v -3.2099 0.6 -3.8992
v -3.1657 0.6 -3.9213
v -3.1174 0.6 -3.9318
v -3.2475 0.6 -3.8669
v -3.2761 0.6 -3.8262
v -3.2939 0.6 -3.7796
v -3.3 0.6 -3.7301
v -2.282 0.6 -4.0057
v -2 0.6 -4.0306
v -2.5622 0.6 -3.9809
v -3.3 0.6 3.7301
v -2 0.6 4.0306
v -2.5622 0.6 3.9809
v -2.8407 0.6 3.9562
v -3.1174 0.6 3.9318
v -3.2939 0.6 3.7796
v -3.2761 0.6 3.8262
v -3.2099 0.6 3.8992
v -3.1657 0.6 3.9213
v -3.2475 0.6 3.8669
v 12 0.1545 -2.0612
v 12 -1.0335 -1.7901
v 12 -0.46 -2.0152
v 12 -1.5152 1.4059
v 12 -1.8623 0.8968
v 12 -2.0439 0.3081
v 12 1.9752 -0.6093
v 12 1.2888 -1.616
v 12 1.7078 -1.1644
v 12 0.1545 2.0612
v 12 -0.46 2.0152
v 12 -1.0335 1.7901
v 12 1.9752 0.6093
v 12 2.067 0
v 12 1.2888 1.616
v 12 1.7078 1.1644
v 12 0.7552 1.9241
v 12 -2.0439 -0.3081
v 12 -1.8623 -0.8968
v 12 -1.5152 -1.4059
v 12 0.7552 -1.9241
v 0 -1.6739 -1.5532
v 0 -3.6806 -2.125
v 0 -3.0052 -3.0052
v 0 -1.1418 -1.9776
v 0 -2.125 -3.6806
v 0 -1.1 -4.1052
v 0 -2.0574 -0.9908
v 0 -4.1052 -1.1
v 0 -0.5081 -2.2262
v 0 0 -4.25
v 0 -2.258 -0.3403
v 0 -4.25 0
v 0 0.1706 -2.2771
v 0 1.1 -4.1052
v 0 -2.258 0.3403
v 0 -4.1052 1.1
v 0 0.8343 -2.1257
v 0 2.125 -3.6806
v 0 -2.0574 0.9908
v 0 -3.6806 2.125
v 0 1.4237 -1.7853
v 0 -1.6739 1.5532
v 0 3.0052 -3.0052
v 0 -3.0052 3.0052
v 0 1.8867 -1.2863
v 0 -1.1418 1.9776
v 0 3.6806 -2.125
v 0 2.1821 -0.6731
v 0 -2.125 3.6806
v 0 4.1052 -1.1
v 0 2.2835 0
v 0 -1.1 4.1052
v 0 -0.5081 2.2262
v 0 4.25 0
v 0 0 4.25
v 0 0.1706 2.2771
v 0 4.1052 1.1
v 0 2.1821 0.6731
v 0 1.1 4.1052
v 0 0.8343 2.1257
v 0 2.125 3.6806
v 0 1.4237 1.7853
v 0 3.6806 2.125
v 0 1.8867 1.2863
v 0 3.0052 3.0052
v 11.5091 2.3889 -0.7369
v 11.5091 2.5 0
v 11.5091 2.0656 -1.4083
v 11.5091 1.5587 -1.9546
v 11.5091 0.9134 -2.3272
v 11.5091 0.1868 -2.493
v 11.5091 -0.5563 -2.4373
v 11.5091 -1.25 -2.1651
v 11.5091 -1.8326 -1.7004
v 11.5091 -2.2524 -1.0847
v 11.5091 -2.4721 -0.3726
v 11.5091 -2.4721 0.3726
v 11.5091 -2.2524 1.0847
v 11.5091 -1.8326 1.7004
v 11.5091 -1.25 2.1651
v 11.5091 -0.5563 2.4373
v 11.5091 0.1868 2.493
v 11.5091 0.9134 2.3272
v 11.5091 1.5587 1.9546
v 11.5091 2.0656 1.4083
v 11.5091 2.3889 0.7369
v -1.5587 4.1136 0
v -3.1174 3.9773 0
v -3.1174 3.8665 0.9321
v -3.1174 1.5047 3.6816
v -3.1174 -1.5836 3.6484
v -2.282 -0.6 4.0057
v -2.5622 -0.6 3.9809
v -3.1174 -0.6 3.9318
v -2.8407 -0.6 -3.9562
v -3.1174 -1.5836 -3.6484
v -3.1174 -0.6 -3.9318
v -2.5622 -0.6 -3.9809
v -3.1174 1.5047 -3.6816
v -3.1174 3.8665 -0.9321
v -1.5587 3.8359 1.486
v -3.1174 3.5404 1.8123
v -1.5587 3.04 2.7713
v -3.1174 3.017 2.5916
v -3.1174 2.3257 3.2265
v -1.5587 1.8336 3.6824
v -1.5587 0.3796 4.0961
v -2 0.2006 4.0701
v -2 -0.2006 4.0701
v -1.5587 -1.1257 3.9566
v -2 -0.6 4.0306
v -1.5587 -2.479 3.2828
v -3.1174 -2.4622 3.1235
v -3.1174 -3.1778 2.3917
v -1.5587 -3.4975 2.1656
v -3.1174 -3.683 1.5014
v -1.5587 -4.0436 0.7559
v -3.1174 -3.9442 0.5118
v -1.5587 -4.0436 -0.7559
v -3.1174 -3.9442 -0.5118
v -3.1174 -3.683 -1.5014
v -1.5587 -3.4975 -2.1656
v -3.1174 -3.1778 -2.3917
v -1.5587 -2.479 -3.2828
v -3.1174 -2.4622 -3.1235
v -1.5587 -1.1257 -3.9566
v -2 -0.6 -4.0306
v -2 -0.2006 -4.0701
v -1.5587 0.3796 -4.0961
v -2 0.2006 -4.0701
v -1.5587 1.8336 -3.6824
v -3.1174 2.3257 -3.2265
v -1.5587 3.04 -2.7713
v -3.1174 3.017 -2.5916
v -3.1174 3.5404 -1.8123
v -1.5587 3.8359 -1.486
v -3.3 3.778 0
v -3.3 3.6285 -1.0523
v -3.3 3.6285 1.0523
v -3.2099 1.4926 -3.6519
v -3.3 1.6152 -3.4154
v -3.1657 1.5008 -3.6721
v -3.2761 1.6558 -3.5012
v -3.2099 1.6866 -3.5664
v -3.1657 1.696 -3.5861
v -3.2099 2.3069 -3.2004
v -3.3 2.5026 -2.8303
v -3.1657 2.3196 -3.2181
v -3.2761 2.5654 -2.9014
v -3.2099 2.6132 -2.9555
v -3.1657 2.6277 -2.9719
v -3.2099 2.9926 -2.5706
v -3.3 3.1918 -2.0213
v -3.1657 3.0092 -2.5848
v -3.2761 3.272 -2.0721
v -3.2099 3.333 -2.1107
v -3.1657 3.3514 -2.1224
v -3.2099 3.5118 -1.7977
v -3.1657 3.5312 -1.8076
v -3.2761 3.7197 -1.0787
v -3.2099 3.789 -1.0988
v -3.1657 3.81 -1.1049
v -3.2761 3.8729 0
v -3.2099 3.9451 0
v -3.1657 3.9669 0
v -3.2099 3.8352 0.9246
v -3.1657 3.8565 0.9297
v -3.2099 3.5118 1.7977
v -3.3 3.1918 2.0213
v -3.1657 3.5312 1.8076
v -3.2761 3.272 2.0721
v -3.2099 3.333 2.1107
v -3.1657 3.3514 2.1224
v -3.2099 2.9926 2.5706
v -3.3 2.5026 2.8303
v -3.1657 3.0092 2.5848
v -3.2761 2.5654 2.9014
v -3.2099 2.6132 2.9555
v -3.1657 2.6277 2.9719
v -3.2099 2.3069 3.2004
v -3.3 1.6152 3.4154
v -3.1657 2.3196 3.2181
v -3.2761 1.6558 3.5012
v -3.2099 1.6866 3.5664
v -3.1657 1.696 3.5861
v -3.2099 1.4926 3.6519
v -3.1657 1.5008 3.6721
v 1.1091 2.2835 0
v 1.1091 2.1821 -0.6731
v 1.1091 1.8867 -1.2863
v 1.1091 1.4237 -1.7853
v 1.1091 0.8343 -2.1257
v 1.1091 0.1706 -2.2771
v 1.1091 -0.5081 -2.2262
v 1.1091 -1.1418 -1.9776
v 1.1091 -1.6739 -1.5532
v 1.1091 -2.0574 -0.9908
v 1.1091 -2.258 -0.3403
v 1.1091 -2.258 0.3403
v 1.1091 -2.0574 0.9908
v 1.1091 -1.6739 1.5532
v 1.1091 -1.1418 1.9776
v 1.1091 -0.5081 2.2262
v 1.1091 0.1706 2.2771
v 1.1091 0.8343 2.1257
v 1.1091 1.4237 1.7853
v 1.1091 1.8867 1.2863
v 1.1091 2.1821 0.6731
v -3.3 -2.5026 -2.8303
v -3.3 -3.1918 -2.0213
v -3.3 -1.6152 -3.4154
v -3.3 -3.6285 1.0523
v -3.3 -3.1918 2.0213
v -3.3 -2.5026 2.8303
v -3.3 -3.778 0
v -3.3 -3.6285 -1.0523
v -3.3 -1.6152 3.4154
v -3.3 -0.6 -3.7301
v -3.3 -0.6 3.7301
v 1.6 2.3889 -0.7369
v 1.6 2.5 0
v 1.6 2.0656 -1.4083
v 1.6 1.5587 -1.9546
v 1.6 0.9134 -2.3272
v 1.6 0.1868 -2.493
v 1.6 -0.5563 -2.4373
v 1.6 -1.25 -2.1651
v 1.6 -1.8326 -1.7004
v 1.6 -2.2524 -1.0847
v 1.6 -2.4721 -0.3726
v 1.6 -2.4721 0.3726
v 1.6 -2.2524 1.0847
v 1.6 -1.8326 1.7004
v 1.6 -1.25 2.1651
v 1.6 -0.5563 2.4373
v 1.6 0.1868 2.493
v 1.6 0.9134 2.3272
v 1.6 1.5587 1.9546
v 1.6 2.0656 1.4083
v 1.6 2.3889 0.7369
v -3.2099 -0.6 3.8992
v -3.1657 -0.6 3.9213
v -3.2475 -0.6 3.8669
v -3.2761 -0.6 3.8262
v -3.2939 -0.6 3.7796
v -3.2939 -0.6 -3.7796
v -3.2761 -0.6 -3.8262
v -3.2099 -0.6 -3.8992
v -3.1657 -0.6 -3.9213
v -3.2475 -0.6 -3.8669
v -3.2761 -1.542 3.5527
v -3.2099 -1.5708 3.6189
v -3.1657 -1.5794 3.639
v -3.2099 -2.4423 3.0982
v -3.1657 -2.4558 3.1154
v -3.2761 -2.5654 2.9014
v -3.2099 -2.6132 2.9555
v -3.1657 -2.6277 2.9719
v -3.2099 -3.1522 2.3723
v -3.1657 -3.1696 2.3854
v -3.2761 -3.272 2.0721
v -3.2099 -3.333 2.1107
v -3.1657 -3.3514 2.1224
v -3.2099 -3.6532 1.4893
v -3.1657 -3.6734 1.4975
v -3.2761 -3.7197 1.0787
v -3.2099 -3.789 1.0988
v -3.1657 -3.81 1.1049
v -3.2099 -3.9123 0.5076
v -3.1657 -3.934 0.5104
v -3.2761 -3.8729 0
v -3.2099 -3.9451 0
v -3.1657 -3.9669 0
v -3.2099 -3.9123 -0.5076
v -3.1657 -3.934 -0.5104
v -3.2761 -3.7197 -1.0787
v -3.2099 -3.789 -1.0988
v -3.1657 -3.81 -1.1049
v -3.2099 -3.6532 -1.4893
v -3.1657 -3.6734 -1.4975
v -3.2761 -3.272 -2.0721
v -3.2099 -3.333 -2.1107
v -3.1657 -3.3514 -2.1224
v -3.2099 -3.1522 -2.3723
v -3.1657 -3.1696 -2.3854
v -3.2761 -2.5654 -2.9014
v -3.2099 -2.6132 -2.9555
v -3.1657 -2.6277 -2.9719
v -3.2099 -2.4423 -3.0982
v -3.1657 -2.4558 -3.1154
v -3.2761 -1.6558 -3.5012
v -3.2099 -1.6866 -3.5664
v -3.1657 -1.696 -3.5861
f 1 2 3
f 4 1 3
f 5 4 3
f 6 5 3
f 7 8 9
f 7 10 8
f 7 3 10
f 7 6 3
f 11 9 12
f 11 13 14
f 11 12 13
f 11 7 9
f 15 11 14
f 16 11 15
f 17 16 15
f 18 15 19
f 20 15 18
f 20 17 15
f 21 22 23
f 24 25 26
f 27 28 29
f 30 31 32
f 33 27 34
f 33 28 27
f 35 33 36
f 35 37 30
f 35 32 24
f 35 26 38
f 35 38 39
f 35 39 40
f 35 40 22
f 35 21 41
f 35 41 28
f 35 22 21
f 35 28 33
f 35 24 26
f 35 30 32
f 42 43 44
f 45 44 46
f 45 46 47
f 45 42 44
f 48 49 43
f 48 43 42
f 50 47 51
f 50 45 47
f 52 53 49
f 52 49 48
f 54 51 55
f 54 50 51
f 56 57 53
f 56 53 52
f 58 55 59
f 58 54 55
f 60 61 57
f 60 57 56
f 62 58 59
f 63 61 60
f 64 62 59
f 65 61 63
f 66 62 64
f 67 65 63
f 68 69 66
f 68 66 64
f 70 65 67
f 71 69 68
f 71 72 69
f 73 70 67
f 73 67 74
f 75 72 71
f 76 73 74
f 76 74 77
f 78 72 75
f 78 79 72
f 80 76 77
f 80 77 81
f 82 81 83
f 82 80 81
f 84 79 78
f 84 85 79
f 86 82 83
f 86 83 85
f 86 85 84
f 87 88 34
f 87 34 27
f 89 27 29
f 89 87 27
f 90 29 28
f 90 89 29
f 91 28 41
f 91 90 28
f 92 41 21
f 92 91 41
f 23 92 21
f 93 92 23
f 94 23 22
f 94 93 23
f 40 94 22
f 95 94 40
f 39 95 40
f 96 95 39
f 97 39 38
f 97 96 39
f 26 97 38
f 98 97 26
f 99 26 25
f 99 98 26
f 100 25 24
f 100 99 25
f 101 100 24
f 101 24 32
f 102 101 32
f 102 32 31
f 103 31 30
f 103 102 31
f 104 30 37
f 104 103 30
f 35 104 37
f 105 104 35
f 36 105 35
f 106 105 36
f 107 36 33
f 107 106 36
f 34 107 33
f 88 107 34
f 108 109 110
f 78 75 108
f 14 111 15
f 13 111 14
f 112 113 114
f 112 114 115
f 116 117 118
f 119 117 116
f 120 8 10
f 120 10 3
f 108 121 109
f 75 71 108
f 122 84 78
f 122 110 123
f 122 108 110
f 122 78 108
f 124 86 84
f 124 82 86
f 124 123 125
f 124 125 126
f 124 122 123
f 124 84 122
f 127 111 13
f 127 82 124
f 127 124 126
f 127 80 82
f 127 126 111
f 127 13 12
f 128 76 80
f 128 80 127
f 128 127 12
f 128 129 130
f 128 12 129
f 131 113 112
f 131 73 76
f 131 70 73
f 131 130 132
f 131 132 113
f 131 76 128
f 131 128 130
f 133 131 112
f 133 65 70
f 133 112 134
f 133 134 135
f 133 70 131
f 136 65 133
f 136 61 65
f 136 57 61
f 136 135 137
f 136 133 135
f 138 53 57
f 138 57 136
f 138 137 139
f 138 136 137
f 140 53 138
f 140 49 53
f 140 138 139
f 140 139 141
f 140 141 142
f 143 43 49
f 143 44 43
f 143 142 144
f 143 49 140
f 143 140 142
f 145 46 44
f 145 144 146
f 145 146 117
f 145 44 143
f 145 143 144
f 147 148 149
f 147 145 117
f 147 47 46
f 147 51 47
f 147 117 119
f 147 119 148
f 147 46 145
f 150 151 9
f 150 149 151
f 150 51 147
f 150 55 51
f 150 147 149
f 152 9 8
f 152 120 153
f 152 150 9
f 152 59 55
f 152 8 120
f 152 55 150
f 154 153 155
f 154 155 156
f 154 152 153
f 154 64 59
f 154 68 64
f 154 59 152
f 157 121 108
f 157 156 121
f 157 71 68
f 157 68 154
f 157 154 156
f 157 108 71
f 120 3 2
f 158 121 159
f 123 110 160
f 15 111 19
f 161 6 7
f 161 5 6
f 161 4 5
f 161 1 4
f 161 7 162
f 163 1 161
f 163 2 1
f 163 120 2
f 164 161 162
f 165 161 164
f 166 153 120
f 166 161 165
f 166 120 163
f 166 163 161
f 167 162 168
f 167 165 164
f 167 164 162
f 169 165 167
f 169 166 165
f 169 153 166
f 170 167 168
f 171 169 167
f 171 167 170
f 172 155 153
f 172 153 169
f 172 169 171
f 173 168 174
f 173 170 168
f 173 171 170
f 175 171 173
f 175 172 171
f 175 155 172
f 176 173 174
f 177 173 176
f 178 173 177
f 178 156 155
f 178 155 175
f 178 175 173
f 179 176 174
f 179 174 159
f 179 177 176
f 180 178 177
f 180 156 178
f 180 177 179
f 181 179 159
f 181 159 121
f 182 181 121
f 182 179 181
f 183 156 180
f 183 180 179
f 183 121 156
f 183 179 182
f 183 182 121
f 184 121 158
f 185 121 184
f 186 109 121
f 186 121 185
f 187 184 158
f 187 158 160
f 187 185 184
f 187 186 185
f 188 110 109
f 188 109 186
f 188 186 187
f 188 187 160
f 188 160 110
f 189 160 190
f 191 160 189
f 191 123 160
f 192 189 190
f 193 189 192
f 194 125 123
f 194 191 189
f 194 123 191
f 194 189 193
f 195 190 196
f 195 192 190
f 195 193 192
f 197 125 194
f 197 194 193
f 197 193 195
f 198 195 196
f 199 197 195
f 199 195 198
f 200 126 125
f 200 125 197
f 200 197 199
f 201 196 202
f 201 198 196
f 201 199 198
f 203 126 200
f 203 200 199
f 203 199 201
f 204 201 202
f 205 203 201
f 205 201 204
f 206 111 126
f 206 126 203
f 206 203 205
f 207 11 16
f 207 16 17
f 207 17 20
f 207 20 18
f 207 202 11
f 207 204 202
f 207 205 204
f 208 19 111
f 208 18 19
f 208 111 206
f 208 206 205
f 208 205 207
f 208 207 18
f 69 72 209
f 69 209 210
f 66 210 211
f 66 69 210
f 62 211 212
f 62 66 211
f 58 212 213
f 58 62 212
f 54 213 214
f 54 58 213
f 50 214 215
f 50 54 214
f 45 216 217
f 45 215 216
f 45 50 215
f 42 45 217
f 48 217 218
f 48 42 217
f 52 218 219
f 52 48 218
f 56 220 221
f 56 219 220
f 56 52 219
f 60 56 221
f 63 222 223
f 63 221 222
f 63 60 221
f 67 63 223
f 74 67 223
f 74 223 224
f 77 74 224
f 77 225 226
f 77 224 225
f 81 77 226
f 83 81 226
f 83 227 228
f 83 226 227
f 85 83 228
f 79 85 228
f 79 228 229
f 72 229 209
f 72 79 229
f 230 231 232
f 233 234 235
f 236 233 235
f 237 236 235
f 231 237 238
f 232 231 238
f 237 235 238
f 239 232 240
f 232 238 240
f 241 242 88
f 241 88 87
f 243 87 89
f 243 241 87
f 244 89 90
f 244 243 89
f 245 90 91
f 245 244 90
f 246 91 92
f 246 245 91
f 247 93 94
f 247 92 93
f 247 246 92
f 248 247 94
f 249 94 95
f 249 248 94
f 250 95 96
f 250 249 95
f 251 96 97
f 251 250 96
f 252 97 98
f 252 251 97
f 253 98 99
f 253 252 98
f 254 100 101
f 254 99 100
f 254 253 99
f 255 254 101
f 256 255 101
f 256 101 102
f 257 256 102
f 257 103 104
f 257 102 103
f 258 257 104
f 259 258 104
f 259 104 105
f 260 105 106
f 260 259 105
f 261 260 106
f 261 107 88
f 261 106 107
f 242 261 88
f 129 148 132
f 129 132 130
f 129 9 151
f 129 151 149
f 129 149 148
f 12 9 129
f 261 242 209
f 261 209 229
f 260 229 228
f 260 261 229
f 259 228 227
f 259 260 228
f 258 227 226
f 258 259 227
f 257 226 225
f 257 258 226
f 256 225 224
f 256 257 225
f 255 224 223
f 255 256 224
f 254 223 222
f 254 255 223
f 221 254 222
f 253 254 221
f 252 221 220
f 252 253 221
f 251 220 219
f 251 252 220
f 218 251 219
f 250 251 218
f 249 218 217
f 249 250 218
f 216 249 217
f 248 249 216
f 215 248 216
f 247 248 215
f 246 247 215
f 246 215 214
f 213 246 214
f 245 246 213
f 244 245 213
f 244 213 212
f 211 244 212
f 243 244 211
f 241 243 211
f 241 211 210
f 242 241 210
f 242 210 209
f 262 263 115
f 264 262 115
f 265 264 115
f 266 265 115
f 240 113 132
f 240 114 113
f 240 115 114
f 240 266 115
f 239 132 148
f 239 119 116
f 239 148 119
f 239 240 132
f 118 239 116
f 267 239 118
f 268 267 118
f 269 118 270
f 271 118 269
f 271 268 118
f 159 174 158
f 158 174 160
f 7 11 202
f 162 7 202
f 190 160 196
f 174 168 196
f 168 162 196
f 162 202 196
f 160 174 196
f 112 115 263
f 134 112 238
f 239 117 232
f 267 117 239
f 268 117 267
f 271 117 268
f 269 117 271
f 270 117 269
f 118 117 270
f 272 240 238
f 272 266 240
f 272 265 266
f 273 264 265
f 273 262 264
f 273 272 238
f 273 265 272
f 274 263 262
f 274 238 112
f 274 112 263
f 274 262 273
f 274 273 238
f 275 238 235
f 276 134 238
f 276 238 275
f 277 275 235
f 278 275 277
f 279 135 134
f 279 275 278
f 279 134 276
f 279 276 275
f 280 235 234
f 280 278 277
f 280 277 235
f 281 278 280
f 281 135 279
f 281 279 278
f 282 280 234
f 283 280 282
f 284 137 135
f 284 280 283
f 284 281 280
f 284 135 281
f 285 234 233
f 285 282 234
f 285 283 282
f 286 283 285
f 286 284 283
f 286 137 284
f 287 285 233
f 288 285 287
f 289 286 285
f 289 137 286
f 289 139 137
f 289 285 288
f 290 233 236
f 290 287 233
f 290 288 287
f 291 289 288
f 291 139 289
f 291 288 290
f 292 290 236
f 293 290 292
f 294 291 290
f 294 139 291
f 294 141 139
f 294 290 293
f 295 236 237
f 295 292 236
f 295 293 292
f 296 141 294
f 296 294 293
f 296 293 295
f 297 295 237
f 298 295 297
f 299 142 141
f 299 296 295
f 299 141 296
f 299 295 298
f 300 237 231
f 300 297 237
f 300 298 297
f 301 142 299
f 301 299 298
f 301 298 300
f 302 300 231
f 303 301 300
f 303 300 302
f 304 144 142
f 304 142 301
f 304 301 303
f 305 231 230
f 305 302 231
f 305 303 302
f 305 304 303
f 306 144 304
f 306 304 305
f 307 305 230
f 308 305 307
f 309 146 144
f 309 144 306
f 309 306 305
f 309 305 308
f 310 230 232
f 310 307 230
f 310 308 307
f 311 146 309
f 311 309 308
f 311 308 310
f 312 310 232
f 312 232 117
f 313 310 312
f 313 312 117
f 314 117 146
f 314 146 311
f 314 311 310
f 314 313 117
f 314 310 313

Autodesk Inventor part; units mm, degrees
ref_plane "YZ Plane" through (0, 0, 0) normal (1, 0, 0) x (0, 1, 0)
ref_plane "XZ Plane" through (0, 0, 0) normal (0, 1, 0) x (-1, 0, 0)
sketch "Sketch1" plane through (0, 0, 0) normal (0, 0, 1) x (1, 0, 0)
  line L0 (-3.3, 0) -> (12, 0)
  line L1 (12, 0) -> (12, 2.5)
  line L2 (12, 2.5) -> (1.6, 2.5)
  line L3 (1.6, 2.5) -> (1.1091, 2.2835)
  line L4 (1.1091, 2.2835) -> (0, 2.2835)
  line L5 (0, 2.2835) -> (0, 4.25)
  line L6 (-6.36, 0) -> (15.06, 0) projected
  line L7 (0, -0.85) -> (0, 5.1) projected
  line L8 (-3.3, 0) -> (-3.3, 3.9613)
  line L9 (0, 4.25) -> (-3.3, 3.9613)
  line L10 (1.6, 2.5) -> (0, 2.5) construction
  dimension "d0" = 12
  dimension "d1" = 10.4
  dimension "d2" = 0.4909
  dimension "d3" = 3.3
  dimension "d4" = 5
  dimension "d5" = 4.567
  dimension "d9" = 8.5
  dimension "d10" = 5
revolve "Body" add sketch "Sketch1" angle 360 about axis through (-3.3, 0, 0) along (1, 0, 0)
sketch "Sketch2" plane through (-3.3, 0, 0) normal (-1, 0, 0) x (0, 0, 1)
  circle A0 centre (0, 0) radius 4.25 projected
  line L0 (0, 0) -> (0, 3.9613) projected
  line L1 (-4.25, 0.6) -> (4.25, 0.6)
  line L2 (4.25, 0.6) -> (4.25, -0.6)
  line L3 (4.25, -0.6) -> (-4.25, -0.6)
  line L4 (-4.25, -0.6) -> (-4.25, 0.6)
  line L5 (-4.25, 0) -> (4.25, 0) construction
  line L6 (0, 0.6) -> (0, -0.6) construction
  dimension "d11" = 1.2
  dimension "d12" = 8.5
fillet "Fillet1" radius 0.2 1 edges at (-3.3, -3.9613, 0)
extrude "Slot" cut sketch "Sketch2" against normal blind 1.3 contours A0 L3 L1 | L2 L3 A0 | A0 L1 L2 | A0 L4 L1 | L3 L4 A0
thread "Thread" size "M5x0.8" class "6g" standard "ISO Metric profile" length 10.4
chamfer "Chamfer1" distance 0.433 distance2 0.4909 1 edges at (12, -2.5, 0) measured on face at (12, 0.6684, -0.7339)
ref_plane "Work Plane1" through (30.1625, 0, 0) normal (0, 0, -1) x (1, 0, 0)
equation "\"d11\" = SBR"
equation "\"d12\" = KOD"
equation "\"d14\" = RR"
equation "\"d19\" = STI"
equation "\"d15\" = GEL"
equation "\"d17\" = -0.5 * SPD + 0.5 * GD"
equation "\"d0\" = NLG"
equation "\"d1\" = GEL"
equation "\"d3\" = KOH"
equation "\"d4\" = GD"
equation "\"d5\" = BDM"
equation "\"d9\" = KOD"
equation "\"d10\" = KEWI"
equation "\"GD\" = 5"
equation "\"NLG\" = 12"
equation "\"GEL\" = 10.4"
equation "\"KOD\" = 8.5"
equation "\"KOH\" = 3.3"
equation "\"GAL\" = 0.61345 * PTC"
equation "\"SPD\" = 4.13397"
equation "\"BDM\" = 4.56699"
equation "\"GUL\" = 0.61345 * PTC"
equation "\"RR\" = 0.2"
equation "\"SBR\" = 1.2"
equation "\"STI\" = 1.3"
equation "\"KEWI\" = 5deg"
equation "\"PTC\" = 0.8"
equation "\"THREADDIA\" = 5"
equation "\"TOA\" = 30deg"
equation "\"NND\" = 5"
equation "\"GD1\" = THREADDIA - 1.2269 * PTC"
properties part number "DIN 84 - M5 x 12" material "Steel, Mild"
